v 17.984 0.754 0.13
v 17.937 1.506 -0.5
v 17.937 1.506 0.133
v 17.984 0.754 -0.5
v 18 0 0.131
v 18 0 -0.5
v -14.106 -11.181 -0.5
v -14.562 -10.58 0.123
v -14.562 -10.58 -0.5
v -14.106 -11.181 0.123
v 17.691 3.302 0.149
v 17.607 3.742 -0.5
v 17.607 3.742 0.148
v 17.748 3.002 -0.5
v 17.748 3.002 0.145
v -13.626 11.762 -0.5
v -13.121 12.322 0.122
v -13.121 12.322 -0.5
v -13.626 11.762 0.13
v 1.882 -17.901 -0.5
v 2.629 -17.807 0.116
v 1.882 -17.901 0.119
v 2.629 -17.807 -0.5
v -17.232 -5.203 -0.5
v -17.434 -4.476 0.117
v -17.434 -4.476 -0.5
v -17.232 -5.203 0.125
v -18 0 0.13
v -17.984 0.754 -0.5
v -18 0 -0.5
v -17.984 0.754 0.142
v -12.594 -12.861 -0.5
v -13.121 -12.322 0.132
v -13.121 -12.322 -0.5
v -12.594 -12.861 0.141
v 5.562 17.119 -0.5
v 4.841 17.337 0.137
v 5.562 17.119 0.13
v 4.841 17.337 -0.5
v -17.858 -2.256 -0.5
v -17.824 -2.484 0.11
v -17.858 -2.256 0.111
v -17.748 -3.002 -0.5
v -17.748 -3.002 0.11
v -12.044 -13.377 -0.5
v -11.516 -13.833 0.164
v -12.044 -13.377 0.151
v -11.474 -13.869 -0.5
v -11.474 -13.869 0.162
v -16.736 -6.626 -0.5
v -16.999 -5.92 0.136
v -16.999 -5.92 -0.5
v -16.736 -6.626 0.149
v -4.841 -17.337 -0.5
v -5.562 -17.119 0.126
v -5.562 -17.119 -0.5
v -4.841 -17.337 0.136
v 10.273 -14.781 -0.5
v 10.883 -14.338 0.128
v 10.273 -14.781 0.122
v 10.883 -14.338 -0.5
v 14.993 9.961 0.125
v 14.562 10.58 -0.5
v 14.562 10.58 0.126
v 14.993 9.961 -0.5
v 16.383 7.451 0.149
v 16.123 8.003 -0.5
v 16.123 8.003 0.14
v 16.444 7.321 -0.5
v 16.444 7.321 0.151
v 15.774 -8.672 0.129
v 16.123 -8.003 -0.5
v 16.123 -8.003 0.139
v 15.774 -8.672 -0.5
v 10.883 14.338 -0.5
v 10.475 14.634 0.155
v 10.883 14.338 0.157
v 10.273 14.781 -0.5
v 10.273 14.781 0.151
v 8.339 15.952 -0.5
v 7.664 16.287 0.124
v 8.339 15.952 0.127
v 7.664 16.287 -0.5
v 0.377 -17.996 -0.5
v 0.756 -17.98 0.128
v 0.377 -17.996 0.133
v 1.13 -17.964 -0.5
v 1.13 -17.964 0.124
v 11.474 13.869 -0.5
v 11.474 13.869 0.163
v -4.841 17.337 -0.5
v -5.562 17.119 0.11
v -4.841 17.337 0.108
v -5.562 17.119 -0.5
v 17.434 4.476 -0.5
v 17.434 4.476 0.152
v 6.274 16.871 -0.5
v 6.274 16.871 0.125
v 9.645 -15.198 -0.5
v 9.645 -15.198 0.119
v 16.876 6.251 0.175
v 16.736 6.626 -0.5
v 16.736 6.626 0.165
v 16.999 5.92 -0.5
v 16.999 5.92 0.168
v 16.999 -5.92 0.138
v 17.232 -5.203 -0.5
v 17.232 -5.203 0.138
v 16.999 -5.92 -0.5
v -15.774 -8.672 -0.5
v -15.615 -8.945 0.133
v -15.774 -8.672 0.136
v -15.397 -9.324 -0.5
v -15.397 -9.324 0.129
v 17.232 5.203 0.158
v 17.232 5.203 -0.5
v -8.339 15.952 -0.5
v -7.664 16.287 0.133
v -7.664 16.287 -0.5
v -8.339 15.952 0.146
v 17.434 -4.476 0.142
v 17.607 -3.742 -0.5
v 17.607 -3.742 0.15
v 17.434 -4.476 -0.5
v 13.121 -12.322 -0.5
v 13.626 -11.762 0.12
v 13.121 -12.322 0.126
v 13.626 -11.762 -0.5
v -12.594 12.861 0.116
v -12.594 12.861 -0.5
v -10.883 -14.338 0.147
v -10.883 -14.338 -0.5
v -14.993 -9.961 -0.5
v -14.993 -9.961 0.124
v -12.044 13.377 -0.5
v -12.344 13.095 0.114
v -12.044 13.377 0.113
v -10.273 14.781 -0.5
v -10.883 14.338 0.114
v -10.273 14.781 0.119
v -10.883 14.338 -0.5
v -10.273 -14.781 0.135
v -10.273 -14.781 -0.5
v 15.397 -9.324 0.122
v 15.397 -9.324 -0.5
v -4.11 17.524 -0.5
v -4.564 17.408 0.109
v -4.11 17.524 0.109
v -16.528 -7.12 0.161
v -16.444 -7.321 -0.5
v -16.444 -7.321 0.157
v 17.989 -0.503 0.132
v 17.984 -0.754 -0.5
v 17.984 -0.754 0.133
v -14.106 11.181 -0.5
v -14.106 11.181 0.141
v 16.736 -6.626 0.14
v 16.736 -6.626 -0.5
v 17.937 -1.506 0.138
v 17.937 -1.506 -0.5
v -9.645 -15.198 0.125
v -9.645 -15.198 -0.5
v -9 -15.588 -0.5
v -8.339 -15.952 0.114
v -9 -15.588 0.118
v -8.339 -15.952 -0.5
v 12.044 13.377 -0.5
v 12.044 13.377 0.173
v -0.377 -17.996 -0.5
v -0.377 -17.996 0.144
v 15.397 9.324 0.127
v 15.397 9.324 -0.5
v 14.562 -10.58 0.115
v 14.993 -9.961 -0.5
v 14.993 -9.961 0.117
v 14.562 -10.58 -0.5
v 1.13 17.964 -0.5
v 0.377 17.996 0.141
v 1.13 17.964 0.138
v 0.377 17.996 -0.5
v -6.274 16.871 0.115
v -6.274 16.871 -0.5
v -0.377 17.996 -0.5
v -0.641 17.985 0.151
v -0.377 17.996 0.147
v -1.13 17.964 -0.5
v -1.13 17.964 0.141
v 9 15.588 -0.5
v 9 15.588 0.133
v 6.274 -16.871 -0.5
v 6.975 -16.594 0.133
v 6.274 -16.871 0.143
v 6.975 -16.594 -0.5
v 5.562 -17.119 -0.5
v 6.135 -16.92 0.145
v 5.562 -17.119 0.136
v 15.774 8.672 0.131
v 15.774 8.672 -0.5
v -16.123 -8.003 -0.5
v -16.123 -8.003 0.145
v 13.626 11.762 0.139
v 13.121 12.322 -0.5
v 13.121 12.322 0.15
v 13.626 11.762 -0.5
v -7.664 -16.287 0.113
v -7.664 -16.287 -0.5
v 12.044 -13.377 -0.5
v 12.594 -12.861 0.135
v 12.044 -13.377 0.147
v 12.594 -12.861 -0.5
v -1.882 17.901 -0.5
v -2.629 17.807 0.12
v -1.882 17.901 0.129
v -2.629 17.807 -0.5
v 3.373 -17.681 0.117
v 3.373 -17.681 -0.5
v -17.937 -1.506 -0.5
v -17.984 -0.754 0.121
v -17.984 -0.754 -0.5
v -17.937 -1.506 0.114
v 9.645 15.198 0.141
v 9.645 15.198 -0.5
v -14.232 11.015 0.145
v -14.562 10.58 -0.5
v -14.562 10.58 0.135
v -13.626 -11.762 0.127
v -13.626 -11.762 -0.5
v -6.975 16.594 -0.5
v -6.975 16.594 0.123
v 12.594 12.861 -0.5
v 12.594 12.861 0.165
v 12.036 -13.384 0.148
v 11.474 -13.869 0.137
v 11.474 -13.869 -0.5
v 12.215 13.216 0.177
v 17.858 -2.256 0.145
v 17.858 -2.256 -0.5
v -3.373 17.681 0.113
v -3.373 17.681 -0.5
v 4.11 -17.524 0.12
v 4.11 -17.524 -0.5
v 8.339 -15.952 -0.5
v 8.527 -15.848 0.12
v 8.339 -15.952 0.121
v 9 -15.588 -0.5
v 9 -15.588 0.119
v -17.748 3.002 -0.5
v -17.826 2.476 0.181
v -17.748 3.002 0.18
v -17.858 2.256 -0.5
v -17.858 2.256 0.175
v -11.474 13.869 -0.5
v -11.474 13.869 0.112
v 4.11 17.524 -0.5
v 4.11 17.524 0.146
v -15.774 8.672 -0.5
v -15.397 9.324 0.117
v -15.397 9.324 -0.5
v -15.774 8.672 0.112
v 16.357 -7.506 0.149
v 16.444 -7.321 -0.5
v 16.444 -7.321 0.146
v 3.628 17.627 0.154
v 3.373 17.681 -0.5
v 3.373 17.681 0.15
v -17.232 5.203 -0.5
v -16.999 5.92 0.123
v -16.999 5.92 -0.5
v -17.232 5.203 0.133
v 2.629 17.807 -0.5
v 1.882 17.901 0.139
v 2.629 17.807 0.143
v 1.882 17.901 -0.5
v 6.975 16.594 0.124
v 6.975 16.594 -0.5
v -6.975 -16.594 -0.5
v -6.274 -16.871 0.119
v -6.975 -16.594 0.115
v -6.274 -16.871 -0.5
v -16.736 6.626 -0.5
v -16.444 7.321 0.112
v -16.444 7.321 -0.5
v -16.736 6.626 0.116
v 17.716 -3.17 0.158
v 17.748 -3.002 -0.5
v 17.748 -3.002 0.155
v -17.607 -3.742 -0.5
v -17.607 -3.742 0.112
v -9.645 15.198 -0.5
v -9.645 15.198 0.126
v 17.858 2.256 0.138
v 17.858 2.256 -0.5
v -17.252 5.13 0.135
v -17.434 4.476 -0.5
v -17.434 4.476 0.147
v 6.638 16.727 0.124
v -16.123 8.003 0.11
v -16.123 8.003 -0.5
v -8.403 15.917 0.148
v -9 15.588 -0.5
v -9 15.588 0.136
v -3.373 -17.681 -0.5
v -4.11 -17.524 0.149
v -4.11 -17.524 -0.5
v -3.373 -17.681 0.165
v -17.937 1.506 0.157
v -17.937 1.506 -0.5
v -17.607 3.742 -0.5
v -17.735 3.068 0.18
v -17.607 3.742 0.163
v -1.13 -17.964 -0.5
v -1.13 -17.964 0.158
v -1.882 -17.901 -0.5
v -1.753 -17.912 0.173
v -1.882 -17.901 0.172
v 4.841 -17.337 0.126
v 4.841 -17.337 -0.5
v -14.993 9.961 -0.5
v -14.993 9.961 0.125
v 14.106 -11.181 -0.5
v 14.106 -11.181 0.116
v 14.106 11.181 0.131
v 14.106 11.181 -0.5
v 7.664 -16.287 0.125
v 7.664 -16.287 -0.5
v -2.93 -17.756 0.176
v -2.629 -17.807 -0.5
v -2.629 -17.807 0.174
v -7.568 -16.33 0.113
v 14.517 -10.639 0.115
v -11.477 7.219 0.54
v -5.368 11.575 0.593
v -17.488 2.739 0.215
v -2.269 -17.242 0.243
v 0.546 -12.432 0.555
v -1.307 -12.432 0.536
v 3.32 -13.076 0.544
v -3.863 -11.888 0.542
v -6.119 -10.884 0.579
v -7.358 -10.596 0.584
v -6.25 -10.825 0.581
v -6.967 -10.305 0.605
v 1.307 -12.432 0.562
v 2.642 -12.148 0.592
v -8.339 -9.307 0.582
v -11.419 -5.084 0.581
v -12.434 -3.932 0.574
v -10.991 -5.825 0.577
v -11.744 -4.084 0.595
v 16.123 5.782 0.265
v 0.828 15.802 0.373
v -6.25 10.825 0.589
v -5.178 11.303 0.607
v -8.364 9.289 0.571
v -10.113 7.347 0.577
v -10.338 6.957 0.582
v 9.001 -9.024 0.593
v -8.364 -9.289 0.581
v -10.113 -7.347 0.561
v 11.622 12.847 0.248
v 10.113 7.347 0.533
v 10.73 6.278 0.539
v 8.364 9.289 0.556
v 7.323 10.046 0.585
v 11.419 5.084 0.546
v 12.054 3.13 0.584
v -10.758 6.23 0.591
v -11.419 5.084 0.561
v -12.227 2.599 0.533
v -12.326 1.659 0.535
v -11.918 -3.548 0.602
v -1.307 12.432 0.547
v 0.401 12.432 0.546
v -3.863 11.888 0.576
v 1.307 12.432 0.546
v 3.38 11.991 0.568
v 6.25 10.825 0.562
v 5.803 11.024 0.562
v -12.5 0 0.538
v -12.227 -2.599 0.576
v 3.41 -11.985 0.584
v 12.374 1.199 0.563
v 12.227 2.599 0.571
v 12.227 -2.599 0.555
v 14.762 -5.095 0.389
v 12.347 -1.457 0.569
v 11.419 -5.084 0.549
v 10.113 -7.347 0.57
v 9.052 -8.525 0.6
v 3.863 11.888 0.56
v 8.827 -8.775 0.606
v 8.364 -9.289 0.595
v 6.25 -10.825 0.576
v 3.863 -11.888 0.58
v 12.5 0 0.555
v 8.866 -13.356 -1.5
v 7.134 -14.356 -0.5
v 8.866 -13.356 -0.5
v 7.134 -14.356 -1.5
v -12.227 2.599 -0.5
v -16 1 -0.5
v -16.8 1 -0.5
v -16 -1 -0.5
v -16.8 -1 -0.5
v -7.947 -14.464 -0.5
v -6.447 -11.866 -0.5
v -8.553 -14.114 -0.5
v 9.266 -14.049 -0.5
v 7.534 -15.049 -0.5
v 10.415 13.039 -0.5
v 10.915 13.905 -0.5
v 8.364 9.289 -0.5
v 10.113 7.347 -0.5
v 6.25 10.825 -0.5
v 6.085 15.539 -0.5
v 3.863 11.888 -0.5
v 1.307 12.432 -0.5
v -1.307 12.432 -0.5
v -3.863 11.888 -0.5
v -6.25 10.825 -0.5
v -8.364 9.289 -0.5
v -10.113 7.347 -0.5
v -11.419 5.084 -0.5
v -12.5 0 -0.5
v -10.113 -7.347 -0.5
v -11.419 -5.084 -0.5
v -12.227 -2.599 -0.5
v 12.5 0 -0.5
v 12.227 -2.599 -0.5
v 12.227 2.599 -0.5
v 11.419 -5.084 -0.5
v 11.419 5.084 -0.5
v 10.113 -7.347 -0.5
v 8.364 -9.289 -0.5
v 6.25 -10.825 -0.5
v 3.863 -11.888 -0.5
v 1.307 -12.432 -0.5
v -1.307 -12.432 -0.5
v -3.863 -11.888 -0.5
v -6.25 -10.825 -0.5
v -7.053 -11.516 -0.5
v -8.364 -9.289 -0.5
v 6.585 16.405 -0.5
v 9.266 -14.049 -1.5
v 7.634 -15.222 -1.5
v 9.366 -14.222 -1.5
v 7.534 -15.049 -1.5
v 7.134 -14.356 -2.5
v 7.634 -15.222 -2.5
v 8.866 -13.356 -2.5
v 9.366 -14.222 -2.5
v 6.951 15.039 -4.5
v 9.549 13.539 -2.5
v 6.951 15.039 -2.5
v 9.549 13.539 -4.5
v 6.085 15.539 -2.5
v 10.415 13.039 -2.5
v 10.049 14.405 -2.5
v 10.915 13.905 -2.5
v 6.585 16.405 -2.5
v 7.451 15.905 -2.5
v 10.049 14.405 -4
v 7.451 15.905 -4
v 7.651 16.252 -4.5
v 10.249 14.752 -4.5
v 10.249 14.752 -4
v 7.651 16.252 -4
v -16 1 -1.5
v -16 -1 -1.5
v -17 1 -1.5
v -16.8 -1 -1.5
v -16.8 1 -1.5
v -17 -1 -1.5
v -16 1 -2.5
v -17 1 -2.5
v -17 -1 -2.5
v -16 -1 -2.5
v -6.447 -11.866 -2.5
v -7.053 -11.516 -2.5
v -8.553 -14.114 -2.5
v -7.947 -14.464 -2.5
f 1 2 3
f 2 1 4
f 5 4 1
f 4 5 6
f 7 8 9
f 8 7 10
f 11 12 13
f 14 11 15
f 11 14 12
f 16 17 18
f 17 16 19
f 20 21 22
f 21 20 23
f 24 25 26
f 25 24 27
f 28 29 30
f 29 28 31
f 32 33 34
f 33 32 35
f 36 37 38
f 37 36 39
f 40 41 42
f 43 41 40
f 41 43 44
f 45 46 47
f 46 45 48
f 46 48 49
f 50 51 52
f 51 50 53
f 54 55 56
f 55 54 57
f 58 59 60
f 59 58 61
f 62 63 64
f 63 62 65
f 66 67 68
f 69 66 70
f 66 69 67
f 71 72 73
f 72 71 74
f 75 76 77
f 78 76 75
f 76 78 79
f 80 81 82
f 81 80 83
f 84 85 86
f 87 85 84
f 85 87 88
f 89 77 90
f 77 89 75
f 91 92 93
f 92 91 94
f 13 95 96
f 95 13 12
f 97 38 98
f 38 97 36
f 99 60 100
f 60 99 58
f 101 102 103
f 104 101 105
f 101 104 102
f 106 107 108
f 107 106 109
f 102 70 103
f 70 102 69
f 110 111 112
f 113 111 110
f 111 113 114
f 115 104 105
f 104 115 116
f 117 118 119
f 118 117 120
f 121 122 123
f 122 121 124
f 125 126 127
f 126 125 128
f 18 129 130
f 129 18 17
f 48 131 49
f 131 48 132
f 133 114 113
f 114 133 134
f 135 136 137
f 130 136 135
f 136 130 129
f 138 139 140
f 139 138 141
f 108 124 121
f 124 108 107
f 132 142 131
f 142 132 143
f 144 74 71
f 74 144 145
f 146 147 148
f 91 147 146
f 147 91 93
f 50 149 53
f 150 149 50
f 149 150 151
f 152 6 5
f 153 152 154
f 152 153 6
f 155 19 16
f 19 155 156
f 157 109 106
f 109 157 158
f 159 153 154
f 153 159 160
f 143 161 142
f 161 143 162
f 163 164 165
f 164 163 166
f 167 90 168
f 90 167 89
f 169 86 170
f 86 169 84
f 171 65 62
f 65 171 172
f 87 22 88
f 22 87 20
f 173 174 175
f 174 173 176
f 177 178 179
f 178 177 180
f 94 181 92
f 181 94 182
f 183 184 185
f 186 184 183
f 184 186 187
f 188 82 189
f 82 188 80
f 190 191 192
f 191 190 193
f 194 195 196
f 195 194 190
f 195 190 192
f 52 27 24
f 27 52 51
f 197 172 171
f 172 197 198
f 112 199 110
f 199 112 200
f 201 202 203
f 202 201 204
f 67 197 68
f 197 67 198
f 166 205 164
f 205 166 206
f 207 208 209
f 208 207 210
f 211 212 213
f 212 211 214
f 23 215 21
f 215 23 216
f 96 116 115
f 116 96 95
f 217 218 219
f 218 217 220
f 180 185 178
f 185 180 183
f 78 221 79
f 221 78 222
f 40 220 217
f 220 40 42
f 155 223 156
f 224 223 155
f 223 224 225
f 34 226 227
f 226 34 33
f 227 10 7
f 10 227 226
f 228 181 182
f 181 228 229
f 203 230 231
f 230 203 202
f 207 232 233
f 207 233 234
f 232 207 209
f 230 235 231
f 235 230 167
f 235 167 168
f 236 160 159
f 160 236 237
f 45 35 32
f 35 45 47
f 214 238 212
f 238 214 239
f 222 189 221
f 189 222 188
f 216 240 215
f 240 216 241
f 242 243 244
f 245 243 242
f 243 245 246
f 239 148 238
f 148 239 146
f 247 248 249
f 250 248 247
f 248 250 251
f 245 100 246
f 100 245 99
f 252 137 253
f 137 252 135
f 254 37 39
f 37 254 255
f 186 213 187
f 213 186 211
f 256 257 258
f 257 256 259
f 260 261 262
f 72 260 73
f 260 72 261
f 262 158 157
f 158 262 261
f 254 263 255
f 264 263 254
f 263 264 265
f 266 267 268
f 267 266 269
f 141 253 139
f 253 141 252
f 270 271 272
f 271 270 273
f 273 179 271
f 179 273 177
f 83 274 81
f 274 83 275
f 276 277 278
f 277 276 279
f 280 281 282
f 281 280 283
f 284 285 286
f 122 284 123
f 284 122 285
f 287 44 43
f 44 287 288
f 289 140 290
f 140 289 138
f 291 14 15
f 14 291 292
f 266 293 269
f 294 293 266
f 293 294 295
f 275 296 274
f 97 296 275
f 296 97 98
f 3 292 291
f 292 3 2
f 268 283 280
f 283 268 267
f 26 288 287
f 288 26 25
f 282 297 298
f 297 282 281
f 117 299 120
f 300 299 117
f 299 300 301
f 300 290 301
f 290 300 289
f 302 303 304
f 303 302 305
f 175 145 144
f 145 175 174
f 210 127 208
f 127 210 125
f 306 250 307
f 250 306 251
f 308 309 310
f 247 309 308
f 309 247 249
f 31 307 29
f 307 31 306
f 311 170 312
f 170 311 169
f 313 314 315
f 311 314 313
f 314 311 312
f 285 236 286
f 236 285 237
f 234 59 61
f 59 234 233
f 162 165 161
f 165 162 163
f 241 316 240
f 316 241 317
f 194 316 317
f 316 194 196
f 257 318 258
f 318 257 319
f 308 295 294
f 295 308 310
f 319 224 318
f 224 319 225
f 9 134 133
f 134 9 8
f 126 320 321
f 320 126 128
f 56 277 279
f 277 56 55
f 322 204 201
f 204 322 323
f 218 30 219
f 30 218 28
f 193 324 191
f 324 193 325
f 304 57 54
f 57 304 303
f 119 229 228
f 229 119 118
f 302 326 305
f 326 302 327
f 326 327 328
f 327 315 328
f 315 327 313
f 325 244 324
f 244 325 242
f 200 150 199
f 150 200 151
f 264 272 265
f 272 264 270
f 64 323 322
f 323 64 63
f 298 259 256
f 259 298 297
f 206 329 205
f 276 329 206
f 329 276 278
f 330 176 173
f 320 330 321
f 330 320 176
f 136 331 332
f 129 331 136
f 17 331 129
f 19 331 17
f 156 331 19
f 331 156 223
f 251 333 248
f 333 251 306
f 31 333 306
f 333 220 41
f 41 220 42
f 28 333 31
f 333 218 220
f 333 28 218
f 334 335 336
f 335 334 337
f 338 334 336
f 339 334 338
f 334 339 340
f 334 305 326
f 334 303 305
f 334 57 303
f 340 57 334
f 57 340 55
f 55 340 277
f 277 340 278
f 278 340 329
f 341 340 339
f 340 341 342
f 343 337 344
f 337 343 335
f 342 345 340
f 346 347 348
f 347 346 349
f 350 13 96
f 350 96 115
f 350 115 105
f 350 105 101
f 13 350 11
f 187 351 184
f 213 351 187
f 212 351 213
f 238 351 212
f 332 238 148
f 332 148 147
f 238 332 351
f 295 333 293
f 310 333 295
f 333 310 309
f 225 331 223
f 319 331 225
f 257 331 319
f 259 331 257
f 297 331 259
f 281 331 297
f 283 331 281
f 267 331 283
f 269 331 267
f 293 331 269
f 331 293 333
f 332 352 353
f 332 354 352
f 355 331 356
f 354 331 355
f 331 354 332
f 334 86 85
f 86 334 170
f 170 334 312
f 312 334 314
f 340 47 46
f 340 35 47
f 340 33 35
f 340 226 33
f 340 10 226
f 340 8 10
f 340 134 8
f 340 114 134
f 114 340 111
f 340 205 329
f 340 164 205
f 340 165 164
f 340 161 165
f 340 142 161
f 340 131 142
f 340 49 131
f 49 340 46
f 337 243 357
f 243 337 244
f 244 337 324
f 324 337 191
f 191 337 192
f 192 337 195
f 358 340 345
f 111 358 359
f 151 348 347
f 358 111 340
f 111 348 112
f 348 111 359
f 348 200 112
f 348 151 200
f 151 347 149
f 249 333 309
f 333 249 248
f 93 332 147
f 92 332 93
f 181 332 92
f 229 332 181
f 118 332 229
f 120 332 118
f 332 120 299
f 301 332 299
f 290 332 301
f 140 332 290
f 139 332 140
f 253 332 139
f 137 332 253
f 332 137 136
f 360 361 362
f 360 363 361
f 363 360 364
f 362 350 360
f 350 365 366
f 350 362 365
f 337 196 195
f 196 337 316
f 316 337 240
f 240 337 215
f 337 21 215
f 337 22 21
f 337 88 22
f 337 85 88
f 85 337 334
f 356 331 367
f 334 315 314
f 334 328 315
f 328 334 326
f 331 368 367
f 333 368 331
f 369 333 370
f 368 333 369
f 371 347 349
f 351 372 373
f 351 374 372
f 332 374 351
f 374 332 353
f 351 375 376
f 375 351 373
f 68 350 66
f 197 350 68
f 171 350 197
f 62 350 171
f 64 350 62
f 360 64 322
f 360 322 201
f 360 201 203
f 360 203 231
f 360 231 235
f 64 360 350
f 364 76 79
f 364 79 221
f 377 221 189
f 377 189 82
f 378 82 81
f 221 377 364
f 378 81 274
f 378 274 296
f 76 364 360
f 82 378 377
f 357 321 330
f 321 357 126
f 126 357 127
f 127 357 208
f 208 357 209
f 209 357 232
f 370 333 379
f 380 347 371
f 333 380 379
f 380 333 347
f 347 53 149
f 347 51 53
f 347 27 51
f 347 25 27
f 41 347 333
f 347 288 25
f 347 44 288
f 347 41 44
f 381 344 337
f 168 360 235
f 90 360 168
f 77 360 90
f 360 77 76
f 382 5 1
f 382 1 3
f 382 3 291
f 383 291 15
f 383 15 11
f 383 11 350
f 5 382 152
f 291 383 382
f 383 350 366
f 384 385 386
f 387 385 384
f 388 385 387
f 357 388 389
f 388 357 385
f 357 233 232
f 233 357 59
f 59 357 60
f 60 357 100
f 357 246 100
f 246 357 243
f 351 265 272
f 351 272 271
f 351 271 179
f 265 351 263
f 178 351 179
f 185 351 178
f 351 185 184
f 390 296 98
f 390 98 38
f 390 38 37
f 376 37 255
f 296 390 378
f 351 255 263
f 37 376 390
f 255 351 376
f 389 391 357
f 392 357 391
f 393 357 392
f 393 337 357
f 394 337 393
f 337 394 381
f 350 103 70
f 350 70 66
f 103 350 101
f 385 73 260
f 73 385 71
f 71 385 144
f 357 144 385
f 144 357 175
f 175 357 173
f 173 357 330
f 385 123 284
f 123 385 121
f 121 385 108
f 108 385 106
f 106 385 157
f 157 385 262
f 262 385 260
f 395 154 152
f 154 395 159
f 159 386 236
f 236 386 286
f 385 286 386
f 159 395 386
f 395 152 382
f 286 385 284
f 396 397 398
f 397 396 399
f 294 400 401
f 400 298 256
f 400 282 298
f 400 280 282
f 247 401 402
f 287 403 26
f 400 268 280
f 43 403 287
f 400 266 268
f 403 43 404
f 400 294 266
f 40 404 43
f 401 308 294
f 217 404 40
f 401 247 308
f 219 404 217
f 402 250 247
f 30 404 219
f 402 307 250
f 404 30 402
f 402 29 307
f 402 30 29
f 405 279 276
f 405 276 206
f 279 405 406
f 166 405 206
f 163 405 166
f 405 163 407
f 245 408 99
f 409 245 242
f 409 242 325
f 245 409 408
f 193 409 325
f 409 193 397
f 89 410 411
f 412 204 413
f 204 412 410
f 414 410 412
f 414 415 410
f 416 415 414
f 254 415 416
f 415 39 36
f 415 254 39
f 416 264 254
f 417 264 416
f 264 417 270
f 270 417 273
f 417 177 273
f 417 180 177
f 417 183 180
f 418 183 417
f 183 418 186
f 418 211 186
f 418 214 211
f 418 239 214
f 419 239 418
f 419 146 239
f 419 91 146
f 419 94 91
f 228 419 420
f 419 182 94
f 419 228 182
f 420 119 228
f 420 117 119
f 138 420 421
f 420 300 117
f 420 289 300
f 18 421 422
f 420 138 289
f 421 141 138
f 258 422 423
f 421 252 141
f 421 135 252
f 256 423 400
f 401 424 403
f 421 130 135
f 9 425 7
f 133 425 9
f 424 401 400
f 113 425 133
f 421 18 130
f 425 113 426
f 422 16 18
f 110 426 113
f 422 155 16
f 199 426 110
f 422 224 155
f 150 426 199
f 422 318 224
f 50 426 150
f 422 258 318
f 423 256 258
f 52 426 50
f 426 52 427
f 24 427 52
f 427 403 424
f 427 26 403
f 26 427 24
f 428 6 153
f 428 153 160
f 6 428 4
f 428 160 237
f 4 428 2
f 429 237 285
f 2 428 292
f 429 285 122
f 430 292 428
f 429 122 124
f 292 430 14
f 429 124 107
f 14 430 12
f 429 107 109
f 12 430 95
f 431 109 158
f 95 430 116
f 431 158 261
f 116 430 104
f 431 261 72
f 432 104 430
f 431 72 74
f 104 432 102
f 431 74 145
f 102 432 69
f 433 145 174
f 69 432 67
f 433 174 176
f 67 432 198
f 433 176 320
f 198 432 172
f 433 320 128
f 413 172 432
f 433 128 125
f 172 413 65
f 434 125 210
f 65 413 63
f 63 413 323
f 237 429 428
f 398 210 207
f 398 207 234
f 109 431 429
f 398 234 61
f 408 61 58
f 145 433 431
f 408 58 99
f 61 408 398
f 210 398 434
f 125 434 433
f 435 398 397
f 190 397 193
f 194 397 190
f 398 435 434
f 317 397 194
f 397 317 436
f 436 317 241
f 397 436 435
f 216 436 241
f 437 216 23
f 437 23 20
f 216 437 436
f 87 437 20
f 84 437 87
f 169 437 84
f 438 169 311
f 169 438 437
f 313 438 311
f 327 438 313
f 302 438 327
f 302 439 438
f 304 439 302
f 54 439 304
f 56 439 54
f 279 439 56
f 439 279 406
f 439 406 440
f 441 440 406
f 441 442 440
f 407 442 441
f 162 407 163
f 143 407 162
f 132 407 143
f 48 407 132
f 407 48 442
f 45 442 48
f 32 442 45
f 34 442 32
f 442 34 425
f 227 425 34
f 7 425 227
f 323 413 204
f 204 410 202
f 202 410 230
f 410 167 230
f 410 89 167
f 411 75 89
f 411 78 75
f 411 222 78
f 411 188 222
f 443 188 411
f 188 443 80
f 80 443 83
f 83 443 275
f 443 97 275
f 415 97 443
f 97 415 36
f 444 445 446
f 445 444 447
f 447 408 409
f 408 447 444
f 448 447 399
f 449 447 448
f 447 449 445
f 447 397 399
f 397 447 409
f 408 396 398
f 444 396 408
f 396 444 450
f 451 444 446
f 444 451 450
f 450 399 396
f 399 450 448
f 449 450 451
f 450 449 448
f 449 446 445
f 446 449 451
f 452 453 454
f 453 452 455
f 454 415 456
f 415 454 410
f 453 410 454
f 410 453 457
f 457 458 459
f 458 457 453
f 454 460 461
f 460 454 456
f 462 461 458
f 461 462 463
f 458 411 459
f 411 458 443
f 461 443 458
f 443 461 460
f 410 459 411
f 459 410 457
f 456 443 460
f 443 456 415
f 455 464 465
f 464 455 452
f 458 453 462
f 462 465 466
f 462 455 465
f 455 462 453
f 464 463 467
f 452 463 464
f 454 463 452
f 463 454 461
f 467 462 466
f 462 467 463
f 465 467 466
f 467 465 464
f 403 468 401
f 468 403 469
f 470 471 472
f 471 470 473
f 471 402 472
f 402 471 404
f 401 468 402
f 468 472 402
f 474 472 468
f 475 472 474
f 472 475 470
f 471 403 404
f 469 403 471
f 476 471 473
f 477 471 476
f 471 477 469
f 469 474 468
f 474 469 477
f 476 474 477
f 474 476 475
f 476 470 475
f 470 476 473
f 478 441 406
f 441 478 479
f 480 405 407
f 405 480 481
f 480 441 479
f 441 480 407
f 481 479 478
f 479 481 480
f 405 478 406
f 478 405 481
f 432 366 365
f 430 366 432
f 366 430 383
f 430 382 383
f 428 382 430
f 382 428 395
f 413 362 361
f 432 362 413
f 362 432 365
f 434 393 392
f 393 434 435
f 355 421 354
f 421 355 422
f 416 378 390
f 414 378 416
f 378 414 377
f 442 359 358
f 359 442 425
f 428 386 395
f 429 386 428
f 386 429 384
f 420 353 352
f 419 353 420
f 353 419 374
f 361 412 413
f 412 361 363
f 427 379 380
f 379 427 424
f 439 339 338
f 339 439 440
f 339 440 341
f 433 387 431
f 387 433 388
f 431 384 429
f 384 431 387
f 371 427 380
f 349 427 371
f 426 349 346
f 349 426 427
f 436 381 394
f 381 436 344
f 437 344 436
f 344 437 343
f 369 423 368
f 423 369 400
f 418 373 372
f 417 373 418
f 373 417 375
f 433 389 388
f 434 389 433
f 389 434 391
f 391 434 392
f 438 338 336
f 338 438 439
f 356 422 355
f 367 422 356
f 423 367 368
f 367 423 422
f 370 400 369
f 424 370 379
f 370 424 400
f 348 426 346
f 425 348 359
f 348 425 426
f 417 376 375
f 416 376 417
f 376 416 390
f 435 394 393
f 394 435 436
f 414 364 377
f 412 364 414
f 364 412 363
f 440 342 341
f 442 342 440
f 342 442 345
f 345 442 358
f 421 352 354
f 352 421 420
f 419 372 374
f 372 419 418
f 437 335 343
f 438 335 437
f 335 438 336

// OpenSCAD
difference(){
    ear();
    translate([0,0,-1]) cylinder(h=3,d=25);
}


module ear(){
    
    $fn=150;
    sphere_size=200;
    intersection(){
        cylinder(h=1,d=36);
        translate([0,0,-sphere_size+1])
        rotate([45,45,0])
        sphere(sphere_size);
    }
    translate([0,0,-0.5])cylinder(h=0.5,d=36);

    translate([-36/2+1.6,0,-1])cube([0.8,2,1], true);
    translate([-36/2+1.5,0,-2])cube([1,2,1], true);

    rotate([0,0,360/3]){
        translate([-36/2+1.6,0,-1])cube([0.8,2,1], true);
        translate([-36/2+1.5,0,-2])cube([1,2,1], true);
    }

    rotate([0,0,360/6]){
        translate([-36/2+3,0,-1.5])cube([3,0.7,2], true);
    }

    rotate([0,0,360/6+180]){
        translate([-36/2+1,0,-1.5])cube([1,5,2], true);
        translate([-36/2+1,0,-3.5])cube([1,3,2], true);
        translate([-36/2+0.7,0,-4.25])cube([1.2,3,0.5], true);
        
    }
}
